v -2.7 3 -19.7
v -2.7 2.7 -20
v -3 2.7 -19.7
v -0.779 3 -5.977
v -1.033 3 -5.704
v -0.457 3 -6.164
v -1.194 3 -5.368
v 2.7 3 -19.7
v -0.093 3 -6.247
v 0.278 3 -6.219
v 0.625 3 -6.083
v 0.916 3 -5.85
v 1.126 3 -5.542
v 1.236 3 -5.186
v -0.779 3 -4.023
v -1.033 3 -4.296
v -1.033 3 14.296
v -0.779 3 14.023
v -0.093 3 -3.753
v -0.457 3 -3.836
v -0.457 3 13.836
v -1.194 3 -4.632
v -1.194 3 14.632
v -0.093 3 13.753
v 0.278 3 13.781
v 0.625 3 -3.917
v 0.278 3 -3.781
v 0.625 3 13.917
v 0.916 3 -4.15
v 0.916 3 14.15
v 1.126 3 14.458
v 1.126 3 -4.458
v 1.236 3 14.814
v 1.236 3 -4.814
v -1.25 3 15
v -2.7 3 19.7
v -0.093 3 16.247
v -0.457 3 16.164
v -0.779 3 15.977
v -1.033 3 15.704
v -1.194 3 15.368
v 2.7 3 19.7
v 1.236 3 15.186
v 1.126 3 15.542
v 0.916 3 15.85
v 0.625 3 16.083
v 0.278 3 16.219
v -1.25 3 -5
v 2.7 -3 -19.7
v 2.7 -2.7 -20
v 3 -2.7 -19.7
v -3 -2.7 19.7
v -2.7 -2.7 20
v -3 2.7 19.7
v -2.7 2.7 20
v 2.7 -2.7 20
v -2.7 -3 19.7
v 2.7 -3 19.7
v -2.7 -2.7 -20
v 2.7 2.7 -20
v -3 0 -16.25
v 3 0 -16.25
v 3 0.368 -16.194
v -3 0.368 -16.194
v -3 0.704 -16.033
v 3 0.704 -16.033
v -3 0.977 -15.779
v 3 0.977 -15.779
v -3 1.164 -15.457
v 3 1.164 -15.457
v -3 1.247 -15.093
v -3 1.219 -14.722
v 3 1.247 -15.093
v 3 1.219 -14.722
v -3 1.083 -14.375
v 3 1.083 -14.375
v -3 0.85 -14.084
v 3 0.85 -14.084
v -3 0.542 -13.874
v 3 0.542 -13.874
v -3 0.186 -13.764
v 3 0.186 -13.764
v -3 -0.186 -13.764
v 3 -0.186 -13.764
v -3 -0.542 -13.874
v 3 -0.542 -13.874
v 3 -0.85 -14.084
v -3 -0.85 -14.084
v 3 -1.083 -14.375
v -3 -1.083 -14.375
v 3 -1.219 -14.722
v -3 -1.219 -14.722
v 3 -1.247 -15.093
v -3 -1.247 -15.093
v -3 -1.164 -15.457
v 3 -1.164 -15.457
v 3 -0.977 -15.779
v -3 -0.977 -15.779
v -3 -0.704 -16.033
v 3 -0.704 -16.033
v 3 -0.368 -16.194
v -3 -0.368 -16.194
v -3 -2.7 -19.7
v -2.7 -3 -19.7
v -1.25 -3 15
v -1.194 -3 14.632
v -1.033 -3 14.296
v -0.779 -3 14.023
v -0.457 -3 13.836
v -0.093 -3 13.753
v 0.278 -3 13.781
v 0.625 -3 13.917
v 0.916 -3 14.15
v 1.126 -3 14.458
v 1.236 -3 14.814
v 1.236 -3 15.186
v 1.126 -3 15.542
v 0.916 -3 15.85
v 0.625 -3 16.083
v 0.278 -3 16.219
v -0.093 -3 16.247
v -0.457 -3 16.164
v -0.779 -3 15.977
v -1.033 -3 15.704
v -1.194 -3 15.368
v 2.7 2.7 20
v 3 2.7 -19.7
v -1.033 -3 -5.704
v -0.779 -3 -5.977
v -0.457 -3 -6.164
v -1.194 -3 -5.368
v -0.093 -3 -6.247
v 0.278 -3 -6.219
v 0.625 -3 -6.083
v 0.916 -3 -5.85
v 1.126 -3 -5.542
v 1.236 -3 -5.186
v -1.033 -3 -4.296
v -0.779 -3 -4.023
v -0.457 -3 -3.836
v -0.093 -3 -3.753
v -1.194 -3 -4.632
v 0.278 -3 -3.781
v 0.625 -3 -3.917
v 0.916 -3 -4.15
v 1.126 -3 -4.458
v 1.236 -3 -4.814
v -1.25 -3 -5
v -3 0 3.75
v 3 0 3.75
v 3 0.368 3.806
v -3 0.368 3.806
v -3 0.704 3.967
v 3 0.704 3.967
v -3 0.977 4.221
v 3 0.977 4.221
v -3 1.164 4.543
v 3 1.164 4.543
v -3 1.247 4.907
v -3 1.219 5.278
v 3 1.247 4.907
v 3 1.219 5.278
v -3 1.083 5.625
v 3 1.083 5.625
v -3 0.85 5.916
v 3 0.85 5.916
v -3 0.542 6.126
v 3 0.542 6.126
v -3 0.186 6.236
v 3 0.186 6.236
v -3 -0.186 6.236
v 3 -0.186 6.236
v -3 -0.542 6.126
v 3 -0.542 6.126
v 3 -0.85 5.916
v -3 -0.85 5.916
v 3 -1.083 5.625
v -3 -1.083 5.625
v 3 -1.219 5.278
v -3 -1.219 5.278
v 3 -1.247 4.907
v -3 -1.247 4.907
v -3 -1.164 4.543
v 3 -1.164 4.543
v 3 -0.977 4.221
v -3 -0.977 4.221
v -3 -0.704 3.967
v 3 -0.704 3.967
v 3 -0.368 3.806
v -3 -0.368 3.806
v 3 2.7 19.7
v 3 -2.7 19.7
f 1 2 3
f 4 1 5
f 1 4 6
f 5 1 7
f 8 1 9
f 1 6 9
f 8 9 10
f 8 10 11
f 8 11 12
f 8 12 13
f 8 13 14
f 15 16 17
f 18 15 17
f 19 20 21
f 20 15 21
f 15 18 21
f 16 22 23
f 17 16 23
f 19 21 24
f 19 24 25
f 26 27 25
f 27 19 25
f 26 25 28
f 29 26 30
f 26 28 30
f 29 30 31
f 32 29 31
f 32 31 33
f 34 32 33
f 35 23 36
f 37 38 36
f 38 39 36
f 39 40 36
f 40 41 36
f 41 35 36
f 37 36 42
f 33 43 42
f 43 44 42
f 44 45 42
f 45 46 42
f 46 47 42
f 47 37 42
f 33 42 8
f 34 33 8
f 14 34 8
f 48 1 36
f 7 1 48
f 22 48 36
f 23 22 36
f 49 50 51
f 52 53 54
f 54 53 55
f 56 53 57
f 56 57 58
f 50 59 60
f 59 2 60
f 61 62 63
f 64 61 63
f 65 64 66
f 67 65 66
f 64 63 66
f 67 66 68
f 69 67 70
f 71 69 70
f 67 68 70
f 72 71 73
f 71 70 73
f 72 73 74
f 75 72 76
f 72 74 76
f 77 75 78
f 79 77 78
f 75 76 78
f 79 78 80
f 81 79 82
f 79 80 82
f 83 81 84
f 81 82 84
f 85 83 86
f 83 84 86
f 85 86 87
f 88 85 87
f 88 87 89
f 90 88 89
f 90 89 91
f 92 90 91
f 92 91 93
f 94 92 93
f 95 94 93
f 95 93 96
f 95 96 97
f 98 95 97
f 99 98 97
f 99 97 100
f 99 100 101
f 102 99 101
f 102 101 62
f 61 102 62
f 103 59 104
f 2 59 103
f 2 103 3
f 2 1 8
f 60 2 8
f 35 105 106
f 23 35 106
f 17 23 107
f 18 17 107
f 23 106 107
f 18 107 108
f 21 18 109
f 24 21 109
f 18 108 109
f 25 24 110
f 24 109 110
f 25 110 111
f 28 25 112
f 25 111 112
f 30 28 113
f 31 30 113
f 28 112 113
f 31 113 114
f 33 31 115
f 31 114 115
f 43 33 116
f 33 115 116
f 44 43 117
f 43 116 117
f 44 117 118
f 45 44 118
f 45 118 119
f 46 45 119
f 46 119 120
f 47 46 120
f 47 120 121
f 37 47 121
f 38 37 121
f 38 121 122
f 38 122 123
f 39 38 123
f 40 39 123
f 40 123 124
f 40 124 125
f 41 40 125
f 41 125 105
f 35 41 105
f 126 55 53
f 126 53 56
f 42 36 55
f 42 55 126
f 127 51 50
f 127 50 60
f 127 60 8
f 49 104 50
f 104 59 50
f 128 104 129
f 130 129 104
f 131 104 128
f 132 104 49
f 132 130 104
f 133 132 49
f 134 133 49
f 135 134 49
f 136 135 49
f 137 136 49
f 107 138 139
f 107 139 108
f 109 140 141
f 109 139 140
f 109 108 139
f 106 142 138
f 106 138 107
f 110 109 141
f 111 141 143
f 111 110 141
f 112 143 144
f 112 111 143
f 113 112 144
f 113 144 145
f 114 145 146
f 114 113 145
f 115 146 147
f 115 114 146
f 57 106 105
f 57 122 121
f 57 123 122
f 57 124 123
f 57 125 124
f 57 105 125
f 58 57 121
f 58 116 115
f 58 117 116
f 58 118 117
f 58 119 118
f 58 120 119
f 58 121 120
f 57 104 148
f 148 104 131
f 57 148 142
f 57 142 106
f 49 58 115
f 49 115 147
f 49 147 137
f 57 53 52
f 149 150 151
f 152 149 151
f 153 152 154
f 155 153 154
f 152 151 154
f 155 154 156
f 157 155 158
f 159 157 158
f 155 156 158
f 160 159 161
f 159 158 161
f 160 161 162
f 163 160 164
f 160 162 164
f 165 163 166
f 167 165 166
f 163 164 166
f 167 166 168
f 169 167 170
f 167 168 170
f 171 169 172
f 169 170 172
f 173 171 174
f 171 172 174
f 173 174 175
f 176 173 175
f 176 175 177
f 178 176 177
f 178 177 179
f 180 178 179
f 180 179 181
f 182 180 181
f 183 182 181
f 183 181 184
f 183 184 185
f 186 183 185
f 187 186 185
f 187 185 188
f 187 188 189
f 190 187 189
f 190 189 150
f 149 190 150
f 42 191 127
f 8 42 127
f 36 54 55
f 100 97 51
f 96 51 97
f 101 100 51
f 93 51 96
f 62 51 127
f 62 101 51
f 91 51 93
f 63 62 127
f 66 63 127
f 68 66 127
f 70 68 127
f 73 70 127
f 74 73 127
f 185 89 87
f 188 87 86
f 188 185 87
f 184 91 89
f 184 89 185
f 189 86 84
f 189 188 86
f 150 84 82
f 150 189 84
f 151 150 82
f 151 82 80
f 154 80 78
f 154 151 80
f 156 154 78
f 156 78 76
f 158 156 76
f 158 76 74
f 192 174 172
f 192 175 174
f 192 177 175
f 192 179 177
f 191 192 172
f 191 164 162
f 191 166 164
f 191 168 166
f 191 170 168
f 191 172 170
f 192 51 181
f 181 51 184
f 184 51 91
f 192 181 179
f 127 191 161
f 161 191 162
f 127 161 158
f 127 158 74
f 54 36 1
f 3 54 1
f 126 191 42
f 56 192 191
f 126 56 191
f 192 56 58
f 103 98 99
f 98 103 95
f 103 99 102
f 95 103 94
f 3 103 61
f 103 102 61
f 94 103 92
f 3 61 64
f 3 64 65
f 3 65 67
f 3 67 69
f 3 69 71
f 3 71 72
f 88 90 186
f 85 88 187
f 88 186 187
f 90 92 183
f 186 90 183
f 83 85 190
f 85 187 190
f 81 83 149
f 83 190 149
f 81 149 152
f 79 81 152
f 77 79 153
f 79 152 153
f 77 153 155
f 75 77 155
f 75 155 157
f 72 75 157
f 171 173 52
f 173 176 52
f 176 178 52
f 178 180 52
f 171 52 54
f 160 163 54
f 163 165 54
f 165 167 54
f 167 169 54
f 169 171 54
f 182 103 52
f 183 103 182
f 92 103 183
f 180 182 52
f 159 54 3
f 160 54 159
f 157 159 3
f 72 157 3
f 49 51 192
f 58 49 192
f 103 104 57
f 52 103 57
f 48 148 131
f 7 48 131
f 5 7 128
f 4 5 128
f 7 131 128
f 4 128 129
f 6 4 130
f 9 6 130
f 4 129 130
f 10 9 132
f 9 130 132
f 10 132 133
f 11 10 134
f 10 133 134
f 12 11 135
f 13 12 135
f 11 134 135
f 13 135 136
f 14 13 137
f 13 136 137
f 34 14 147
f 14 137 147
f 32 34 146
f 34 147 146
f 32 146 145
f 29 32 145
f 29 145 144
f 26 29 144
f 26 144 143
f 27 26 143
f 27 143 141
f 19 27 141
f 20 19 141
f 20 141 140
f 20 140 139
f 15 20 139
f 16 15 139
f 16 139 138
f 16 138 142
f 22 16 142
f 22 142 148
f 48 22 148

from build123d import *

# Parameters (mm, degrees)
SKETCH_1_W      = 6
SKETCH_1_H      = 6
EXTRUDE_1_DEPTH = 20
HOLE_WIZARD_1_D = 2.5
HOLE_WIZARD_2_D = 2.5
CHAMFER_1_SIZE  = 0.3


with BuildPart() as part:
    # 草图1 → 凸台-拉伸1 (new, symmetric)
    with BuildSketch(Plane.XY):
        Rectangle(SKETCH_1_W, SKETCH_1_H)
    extrude(amount=EXTRUDE_1_DEPTH, both=True)

    # Hole Wizard 1 (through all)
    with Locations(Plane.ZY.offset(3)):
        with Locations((-15, 0), (5, 0)):
            Hole(HOLE_WIZARD_1_D / 2)

    # Hole Wizard 2 (through all)
    with Locations(Plane(origin=(0, 3, 0), x_dir=(1, 0, 0), z_dir=(0, 1, 0))):
        with Locations((0, 5), (0, -15)):
            Hole(HOLE_WIZARD_2_D / 2)

    # 倒角1
    chamfer_1_edges = [part.edges().sort_by_distance(p)[0] for p in [
        (-3, 0, 20),
        (0, -3, 20),
        (3, 0, 20),
        (0, -3, -20),
        (-3, 0, -20),
        (0, 3, -20),
        (3, 0, -20),
        (3, -3, 0),
        (-3, -3, 0),
        (-3, 3, 0),
        (3, 3, 0),
        (0, 3, 20),
    ]]
    chamfer(chamfer_1_edges, length=CHAMFER_1_SIZE)


solid = part.part
